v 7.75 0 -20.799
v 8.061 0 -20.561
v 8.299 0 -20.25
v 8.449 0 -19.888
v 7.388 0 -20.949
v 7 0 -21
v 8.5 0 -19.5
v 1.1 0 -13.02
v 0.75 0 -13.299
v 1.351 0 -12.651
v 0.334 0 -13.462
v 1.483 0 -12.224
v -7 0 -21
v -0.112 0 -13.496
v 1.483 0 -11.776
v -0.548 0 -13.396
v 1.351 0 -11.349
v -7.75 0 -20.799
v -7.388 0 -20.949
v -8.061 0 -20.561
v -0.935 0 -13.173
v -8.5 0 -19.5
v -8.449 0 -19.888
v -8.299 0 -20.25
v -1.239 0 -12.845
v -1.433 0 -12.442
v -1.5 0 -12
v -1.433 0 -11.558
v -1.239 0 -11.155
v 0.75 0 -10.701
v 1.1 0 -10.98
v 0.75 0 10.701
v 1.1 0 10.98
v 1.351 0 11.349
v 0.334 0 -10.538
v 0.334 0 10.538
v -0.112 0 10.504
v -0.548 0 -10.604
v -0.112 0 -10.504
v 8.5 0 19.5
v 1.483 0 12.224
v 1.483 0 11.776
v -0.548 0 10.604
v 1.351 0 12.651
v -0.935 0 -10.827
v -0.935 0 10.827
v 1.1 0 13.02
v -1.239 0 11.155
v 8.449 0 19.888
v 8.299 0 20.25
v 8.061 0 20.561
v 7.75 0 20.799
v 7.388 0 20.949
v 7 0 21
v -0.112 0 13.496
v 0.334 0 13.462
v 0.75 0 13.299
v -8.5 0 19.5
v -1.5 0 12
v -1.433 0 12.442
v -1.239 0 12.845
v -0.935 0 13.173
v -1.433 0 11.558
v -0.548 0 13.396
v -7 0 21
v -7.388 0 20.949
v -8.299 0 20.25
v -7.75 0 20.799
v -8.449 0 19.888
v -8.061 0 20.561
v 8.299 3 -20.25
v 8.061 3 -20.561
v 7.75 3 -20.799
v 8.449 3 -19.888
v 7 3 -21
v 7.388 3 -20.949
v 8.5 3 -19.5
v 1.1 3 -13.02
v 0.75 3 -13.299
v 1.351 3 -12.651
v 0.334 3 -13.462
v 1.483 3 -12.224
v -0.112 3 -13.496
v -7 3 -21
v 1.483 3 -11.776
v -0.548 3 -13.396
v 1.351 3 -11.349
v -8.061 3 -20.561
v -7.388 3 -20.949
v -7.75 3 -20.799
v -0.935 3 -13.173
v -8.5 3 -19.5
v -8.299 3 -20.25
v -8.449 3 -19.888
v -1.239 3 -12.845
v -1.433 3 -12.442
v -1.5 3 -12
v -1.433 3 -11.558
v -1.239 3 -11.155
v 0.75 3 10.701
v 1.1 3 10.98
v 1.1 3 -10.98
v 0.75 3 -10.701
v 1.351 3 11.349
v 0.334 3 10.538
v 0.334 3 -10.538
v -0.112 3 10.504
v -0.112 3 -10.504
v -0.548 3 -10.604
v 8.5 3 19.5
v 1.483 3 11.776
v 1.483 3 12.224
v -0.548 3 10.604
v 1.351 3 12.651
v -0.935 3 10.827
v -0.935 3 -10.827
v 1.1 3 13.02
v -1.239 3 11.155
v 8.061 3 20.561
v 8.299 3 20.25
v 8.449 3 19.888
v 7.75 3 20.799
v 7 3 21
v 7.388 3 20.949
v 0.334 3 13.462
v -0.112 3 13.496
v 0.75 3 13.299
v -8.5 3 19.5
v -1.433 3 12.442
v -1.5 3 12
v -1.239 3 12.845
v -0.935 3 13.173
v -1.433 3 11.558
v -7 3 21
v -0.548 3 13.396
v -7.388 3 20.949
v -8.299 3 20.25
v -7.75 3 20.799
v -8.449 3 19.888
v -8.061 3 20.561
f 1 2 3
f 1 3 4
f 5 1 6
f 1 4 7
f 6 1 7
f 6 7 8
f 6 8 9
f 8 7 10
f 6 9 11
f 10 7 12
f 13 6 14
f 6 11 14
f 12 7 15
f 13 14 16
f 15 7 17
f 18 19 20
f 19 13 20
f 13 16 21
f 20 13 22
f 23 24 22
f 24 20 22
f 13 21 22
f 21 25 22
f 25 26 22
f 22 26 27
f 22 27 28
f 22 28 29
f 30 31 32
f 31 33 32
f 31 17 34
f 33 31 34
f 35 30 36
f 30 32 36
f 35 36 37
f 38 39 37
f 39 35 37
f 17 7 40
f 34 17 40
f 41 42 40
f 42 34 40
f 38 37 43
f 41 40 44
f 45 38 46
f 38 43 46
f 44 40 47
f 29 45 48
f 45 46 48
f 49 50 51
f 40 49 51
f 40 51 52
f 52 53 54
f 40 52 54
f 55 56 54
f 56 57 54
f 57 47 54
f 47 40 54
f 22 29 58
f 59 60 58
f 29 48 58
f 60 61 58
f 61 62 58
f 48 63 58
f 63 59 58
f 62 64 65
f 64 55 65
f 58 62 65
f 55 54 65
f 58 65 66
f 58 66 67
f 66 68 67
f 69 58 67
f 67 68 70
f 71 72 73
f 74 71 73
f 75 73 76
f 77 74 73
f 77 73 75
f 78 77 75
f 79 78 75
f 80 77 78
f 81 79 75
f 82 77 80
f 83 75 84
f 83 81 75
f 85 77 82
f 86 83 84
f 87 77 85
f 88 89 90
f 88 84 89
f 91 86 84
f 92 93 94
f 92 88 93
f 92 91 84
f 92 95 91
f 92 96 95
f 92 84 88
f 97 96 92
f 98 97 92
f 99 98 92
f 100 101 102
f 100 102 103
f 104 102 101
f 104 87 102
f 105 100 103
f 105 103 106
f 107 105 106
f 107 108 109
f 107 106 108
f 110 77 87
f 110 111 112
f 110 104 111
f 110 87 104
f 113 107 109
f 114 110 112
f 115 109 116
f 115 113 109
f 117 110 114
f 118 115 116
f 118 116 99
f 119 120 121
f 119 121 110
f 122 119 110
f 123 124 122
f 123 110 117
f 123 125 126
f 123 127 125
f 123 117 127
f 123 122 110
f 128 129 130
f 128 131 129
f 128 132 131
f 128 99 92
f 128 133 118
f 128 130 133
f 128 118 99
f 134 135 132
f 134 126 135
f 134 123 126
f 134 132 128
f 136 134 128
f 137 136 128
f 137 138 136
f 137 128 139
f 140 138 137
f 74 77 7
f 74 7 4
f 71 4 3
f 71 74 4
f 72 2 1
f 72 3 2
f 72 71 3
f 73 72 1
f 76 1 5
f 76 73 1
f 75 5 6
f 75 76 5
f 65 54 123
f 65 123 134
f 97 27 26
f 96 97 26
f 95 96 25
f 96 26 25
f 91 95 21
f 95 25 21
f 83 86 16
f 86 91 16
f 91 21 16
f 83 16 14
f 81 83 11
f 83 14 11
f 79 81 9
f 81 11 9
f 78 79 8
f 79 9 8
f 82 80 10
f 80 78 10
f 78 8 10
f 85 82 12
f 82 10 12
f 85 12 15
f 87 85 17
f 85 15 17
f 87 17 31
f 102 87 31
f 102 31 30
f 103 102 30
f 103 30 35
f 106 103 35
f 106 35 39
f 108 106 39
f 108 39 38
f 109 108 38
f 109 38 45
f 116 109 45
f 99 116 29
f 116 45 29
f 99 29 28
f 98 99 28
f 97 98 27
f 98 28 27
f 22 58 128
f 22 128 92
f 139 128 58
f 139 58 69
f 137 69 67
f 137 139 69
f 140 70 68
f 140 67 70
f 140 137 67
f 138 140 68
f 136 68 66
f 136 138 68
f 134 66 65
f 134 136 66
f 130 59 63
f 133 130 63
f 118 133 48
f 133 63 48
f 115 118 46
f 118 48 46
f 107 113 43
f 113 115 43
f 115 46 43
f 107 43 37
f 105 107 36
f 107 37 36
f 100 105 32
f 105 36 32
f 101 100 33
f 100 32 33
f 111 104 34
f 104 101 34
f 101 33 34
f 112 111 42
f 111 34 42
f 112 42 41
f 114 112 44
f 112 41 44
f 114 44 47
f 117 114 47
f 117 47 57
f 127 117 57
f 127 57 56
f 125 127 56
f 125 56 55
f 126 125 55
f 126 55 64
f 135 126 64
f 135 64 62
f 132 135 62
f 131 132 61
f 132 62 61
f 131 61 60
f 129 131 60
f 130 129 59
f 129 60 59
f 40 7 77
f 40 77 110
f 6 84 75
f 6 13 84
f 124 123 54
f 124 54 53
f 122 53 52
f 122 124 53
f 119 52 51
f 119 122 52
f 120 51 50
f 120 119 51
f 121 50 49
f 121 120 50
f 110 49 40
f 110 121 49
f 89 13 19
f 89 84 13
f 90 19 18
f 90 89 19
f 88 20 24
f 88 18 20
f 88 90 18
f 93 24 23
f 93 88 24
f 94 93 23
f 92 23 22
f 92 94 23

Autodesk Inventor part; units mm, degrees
ref_plane "YZ Plane" through (0, 0, 0) normal (1, 0, 0) x (0, 1, 0)
ref_plane "XZ Plane" through (0, 0, 0) normal (0, 1, 0) x (-1, 0, 0)
ref_plane "XY Plane" through (0, 0, 0) normal (0, 0, 1) x (1, 0, 0)
sketch "Sketch1" plane through (0, 0, 0) normal (0, 1, 0) x (-1, 0, 0)
  line L0 (11.5, 24) -> (-11.5, 24)
  line L1 (-11.5, 24) -> (-11.5, -24)
  line L2 (-11.5, -24) -> (11.5, -24)
  line L3 (11.5, -24) -> (11.5, 24)
  line L4 (11.5, 24) -> (-11.5, -24) construction
  line L5 (-11.5, 24) -> (11.5, -24) construction
  line L6 (-8.5, 21) -> (8.5, 21)
  line L7 (8.5, 21) -> (8.5, -21)
  line L8 (8.5, -21) -> (-8.5, -21)
  line L9 (-8.5, -21) -> (-8.5, 21)
  line L10 (-8.5, 21) -> (8.5, -21) construction
  line L11 (8.5, 21) -> (-8.5, -21) construction
  line L12 (0, 0) -> (-8.5, 0) construction
  circle A0 centre (0, -12) radius 1.5
  circle A1 centre (0, 12) radius 1.5
  line L13 (17.5, 30) -> (-17.5, 30)
  line L14 (-17.5, 30) -> (-17.5, -30)
  line L15 (-17.5, -30) -> (17.5, -30)
  line L16 (17.5, -30) -> (17.5, 30)
  line L17 (17.5, 30) -> (-17.5, -30) construction
  line L18 (-17.5, 30) -> (17.5, -30) construction
  dimension "d0" = 23
  dimension "d1" = 48
  dimension "d3" = 3
  dimension "d4" = 3
  dimension "d5" = 3
  dimension "d6" = 12
  dimension "d9" = 6
  dimension "d10" = 6
extrude "Extrusion1" add sketch "Sketch1" along normal blind 3 contours L6 L7 L8 L9
fillet "Fillet1" radius 1.5 4 edges at (8.5, 1.5, 21) (8.5, 1.5, -21) (-8.5, 1.5, 21) (-8.5, 1.5, -21)
properties part number "Middle internal"
